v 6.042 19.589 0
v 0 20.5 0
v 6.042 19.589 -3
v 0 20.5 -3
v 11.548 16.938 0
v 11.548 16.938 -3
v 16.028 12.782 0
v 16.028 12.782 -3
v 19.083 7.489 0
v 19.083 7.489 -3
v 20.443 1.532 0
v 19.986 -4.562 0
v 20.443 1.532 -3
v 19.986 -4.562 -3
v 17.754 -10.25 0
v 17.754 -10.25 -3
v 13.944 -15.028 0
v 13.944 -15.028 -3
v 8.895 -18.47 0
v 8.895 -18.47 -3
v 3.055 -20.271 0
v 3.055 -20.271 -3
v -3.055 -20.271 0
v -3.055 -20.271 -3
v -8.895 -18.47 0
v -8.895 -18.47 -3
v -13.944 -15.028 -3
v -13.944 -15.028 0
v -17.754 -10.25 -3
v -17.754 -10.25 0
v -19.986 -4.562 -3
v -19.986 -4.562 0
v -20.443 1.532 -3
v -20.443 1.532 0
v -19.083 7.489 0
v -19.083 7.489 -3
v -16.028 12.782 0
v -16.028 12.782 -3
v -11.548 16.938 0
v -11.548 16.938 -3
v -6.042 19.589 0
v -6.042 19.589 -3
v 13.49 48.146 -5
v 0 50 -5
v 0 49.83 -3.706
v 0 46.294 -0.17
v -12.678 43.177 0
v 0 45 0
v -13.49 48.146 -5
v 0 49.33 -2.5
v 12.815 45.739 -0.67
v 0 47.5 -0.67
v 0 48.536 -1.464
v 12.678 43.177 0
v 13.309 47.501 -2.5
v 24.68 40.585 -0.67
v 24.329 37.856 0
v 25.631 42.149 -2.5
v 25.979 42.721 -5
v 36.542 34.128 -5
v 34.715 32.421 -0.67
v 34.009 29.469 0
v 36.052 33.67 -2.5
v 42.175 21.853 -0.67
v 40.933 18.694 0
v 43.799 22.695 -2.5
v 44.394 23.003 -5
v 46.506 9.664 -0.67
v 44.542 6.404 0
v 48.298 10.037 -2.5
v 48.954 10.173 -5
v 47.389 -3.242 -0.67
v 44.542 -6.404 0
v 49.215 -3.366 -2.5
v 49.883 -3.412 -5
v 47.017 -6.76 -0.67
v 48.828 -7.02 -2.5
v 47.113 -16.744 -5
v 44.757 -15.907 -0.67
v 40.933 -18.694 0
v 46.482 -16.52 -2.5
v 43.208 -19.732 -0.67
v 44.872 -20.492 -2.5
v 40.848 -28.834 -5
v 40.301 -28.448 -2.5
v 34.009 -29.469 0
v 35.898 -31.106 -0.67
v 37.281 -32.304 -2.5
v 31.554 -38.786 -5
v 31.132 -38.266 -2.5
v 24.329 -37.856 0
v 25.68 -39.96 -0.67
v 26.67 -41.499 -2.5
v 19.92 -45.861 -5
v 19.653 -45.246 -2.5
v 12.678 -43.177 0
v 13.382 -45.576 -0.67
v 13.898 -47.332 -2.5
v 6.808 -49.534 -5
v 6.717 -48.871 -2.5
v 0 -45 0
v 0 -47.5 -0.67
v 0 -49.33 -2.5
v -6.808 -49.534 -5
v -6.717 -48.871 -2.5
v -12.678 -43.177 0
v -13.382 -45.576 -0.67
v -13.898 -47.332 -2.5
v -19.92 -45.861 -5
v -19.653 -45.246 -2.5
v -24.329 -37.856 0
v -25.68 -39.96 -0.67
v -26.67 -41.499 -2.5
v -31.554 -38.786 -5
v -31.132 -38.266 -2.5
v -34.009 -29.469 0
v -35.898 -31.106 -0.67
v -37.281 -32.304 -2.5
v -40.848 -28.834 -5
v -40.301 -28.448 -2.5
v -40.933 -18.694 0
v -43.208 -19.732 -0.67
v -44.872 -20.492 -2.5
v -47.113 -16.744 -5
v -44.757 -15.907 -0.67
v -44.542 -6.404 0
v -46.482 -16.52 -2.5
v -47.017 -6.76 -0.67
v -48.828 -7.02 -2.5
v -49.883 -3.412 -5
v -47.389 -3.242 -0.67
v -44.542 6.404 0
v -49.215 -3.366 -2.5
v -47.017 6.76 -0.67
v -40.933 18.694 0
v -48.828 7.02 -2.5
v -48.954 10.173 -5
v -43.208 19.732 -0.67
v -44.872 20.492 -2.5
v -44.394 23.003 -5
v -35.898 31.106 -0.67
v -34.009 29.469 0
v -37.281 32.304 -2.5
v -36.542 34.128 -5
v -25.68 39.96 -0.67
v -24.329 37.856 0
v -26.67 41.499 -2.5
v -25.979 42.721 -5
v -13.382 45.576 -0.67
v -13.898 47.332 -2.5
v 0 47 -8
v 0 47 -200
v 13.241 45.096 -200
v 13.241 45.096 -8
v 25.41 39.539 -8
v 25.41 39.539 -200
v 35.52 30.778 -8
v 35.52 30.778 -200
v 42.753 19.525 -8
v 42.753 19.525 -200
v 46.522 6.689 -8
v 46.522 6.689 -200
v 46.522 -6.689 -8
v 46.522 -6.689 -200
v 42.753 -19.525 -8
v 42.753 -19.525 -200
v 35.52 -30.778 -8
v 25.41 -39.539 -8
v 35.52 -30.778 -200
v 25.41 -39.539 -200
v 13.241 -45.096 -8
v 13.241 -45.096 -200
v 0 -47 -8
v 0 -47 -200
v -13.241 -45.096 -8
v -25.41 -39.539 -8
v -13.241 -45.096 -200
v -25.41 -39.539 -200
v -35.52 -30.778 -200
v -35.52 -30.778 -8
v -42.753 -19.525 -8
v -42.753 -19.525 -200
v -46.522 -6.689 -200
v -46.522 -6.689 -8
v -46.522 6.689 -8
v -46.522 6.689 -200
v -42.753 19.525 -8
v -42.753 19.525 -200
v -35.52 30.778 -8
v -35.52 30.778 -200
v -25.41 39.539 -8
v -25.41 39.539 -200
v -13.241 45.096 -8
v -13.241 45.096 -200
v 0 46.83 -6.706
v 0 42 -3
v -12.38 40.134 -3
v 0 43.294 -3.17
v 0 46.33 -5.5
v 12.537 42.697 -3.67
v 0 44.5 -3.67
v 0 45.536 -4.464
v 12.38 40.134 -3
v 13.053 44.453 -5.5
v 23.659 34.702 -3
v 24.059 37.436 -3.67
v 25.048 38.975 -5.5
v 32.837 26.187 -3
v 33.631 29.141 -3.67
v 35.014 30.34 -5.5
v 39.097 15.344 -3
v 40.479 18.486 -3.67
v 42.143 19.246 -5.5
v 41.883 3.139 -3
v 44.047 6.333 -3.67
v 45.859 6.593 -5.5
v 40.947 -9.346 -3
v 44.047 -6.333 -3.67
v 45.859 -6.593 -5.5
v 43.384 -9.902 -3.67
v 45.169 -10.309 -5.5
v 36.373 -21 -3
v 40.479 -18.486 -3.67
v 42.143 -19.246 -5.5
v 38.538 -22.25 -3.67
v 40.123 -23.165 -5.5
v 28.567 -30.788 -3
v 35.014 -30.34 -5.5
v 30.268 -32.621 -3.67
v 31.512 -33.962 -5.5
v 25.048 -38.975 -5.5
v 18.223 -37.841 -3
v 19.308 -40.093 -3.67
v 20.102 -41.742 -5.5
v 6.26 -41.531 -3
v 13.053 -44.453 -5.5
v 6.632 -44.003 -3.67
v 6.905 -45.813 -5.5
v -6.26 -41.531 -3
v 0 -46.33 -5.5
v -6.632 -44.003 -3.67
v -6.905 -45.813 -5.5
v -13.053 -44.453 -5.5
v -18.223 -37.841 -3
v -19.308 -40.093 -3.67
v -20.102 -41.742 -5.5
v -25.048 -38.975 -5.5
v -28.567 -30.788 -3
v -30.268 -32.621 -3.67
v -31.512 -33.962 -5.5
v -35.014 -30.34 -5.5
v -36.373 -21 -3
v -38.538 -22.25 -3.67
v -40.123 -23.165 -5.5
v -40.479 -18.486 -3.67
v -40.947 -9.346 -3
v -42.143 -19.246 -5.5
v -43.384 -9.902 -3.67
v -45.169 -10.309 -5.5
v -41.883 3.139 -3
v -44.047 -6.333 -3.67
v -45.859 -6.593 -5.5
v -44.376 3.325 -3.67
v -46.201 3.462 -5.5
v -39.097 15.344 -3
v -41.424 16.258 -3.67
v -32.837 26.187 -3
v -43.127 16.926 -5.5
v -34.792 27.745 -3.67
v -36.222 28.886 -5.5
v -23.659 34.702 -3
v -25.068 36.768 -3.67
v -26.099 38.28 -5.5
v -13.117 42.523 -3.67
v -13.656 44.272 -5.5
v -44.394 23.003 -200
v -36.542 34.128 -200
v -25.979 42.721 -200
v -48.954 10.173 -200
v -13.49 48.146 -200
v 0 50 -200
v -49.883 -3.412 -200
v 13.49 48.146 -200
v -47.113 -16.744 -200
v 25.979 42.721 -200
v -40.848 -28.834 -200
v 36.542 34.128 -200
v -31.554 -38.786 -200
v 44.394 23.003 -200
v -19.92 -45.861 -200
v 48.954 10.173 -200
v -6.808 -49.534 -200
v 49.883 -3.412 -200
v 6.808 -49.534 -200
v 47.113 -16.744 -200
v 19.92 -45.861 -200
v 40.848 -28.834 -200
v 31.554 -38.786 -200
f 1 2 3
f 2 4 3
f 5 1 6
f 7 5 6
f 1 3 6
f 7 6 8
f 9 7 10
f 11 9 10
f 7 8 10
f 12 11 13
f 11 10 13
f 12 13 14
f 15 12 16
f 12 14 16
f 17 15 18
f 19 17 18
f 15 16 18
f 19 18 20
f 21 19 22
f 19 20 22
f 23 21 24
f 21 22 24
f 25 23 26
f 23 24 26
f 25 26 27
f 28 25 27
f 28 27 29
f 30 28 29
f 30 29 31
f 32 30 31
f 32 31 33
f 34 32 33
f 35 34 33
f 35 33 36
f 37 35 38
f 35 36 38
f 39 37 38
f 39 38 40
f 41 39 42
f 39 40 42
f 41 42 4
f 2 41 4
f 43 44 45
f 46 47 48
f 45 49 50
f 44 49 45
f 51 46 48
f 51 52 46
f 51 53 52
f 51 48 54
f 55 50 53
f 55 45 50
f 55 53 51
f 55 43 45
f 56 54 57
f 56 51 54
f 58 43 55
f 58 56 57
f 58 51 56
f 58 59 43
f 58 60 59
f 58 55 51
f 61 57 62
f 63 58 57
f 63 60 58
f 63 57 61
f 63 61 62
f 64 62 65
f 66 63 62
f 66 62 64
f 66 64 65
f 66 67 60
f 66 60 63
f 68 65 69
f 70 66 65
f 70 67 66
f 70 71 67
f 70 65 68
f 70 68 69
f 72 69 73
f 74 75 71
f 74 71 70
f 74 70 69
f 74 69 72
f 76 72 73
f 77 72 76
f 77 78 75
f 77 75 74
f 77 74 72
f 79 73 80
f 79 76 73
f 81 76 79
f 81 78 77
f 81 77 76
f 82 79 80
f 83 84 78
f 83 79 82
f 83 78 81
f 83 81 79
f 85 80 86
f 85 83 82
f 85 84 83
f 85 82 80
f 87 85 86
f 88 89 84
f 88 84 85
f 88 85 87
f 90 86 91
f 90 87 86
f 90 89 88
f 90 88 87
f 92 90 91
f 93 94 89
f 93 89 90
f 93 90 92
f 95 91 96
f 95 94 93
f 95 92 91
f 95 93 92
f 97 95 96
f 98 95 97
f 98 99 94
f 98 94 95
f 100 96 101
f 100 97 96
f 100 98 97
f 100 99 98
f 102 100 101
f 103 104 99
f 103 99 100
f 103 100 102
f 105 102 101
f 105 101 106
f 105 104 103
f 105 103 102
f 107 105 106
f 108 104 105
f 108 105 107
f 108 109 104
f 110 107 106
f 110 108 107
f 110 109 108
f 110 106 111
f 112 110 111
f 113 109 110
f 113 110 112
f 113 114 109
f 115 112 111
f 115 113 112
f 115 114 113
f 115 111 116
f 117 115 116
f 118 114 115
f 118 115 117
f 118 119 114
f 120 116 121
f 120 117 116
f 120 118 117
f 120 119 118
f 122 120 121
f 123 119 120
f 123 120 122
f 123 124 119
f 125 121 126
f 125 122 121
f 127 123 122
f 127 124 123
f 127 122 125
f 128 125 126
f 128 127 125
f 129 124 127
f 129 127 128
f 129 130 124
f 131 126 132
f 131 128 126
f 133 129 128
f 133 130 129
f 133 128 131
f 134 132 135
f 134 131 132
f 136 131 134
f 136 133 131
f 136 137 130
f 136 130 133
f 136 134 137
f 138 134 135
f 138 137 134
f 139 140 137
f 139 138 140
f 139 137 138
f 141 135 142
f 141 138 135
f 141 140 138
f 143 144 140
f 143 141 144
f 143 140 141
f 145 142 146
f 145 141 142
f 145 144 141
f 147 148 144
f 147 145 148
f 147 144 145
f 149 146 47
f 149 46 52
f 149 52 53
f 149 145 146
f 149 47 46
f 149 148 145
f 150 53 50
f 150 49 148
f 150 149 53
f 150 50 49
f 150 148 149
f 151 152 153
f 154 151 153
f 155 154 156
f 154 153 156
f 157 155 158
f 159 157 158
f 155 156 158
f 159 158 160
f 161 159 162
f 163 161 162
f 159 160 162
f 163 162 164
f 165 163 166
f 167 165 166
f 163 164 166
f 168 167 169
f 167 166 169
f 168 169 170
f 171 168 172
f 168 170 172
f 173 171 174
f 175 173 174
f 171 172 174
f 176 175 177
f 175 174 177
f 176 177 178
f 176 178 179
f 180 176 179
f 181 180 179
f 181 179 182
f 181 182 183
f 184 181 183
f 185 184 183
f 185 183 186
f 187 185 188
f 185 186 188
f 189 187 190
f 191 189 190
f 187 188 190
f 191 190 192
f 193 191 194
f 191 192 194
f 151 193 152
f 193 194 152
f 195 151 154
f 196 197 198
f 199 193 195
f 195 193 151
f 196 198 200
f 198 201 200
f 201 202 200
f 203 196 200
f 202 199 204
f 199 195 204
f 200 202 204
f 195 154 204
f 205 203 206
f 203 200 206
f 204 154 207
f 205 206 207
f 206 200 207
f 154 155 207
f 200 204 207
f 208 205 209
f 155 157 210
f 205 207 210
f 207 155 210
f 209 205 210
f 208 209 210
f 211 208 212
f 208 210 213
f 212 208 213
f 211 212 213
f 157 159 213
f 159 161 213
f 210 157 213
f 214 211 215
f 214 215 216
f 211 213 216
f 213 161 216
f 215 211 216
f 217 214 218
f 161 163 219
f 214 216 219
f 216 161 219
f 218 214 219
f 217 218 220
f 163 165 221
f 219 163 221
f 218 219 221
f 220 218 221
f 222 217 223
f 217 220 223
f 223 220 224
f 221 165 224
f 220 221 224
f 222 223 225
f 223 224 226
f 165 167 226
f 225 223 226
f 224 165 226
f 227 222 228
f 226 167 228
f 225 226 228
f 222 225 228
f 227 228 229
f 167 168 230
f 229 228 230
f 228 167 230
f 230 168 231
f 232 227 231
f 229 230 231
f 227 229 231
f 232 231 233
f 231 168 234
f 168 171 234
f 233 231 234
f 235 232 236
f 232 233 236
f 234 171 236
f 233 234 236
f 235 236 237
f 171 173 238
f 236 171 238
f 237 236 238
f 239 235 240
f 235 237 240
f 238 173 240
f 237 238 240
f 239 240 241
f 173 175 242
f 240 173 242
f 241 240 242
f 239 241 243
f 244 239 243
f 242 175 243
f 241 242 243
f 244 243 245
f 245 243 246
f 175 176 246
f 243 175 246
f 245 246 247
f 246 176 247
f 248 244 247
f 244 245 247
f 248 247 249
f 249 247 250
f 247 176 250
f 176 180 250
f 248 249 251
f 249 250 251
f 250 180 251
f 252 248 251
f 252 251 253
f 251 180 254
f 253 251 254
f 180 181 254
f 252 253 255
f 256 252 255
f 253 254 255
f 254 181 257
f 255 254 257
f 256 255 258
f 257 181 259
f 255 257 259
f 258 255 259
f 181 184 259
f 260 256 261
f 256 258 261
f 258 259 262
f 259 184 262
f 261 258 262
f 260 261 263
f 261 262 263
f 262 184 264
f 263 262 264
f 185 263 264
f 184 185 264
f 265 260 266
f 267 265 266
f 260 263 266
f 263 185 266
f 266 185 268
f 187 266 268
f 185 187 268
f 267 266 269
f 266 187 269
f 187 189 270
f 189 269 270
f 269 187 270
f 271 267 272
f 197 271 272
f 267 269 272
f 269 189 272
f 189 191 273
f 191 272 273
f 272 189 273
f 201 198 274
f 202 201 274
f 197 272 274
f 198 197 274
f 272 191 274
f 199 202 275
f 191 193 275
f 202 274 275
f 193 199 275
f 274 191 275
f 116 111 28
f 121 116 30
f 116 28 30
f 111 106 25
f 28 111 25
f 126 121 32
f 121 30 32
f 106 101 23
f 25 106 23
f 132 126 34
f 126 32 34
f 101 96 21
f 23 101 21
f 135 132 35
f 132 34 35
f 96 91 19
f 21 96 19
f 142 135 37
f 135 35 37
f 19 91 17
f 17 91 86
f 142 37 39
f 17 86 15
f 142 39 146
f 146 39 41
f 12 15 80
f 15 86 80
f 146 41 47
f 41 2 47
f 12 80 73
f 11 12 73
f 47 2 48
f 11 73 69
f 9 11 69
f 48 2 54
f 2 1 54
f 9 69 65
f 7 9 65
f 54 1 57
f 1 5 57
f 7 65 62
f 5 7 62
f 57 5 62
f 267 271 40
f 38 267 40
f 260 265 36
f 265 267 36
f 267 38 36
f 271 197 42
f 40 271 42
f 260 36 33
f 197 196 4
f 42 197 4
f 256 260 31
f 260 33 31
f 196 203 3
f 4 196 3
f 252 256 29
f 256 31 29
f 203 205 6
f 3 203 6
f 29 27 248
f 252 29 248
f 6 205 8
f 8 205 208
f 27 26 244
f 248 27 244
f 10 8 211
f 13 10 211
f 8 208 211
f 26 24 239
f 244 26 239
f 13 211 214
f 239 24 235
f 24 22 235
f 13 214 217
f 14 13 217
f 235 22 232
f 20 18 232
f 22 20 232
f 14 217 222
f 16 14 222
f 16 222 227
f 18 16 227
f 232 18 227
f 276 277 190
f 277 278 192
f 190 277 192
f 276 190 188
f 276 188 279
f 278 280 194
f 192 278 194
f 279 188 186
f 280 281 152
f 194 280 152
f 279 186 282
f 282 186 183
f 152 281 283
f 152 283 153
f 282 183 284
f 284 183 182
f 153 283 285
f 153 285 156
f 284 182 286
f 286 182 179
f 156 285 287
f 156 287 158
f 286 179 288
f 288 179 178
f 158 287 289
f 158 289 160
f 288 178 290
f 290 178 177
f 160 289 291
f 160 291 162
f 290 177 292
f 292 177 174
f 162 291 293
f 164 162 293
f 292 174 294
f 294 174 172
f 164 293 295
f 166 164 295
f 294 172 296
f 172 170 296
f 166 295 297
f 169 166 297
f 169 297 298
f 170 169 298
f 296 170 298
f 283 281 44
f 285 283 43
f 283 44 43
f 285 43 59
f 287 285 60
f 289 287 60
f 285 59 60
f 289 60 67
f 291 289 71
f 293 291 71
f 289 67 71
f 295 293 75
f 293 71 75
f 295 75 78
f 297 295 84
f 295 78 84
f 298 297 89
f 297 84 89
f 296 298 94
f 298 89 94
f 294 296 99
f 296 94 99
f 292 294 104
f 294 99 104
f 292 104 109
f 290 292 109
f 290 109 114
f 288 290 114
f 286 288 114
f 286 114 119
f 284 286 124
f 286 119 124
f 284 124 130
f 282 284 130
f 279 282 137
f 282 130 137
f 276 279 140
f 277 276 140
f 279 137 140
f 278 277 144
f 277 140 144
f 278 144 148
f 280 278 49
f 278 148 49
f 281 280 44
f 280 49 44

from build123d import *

# Parameters (mm, degrees)
FILLET_1_R = 5


with BuildPart() as part:
    # Эскиз1 → Повернуть1 (revolve)
    with BuildSketch(Plane(origin=(0, 0, 0), x_dir=(0, 0, -1), z_dir=(1, 0, 0))):
        Polygon((0, 50), (0, 20.5), (3, 20.5), (3, 47), (200, 47), (200, 50), align=None)
    revolve(axis=Axis((0, 0, 0), (0, 0, -1)))

    # Скругление1
    fillet_1_edges = [part.edges().sort_by_distance(p)[0] for p in [
        (0, -47, -3),
        (0, -50, 0),
    ]]
    fillet(fillet_1_edges, radius=FILLET_1_R)


solid = part.part
